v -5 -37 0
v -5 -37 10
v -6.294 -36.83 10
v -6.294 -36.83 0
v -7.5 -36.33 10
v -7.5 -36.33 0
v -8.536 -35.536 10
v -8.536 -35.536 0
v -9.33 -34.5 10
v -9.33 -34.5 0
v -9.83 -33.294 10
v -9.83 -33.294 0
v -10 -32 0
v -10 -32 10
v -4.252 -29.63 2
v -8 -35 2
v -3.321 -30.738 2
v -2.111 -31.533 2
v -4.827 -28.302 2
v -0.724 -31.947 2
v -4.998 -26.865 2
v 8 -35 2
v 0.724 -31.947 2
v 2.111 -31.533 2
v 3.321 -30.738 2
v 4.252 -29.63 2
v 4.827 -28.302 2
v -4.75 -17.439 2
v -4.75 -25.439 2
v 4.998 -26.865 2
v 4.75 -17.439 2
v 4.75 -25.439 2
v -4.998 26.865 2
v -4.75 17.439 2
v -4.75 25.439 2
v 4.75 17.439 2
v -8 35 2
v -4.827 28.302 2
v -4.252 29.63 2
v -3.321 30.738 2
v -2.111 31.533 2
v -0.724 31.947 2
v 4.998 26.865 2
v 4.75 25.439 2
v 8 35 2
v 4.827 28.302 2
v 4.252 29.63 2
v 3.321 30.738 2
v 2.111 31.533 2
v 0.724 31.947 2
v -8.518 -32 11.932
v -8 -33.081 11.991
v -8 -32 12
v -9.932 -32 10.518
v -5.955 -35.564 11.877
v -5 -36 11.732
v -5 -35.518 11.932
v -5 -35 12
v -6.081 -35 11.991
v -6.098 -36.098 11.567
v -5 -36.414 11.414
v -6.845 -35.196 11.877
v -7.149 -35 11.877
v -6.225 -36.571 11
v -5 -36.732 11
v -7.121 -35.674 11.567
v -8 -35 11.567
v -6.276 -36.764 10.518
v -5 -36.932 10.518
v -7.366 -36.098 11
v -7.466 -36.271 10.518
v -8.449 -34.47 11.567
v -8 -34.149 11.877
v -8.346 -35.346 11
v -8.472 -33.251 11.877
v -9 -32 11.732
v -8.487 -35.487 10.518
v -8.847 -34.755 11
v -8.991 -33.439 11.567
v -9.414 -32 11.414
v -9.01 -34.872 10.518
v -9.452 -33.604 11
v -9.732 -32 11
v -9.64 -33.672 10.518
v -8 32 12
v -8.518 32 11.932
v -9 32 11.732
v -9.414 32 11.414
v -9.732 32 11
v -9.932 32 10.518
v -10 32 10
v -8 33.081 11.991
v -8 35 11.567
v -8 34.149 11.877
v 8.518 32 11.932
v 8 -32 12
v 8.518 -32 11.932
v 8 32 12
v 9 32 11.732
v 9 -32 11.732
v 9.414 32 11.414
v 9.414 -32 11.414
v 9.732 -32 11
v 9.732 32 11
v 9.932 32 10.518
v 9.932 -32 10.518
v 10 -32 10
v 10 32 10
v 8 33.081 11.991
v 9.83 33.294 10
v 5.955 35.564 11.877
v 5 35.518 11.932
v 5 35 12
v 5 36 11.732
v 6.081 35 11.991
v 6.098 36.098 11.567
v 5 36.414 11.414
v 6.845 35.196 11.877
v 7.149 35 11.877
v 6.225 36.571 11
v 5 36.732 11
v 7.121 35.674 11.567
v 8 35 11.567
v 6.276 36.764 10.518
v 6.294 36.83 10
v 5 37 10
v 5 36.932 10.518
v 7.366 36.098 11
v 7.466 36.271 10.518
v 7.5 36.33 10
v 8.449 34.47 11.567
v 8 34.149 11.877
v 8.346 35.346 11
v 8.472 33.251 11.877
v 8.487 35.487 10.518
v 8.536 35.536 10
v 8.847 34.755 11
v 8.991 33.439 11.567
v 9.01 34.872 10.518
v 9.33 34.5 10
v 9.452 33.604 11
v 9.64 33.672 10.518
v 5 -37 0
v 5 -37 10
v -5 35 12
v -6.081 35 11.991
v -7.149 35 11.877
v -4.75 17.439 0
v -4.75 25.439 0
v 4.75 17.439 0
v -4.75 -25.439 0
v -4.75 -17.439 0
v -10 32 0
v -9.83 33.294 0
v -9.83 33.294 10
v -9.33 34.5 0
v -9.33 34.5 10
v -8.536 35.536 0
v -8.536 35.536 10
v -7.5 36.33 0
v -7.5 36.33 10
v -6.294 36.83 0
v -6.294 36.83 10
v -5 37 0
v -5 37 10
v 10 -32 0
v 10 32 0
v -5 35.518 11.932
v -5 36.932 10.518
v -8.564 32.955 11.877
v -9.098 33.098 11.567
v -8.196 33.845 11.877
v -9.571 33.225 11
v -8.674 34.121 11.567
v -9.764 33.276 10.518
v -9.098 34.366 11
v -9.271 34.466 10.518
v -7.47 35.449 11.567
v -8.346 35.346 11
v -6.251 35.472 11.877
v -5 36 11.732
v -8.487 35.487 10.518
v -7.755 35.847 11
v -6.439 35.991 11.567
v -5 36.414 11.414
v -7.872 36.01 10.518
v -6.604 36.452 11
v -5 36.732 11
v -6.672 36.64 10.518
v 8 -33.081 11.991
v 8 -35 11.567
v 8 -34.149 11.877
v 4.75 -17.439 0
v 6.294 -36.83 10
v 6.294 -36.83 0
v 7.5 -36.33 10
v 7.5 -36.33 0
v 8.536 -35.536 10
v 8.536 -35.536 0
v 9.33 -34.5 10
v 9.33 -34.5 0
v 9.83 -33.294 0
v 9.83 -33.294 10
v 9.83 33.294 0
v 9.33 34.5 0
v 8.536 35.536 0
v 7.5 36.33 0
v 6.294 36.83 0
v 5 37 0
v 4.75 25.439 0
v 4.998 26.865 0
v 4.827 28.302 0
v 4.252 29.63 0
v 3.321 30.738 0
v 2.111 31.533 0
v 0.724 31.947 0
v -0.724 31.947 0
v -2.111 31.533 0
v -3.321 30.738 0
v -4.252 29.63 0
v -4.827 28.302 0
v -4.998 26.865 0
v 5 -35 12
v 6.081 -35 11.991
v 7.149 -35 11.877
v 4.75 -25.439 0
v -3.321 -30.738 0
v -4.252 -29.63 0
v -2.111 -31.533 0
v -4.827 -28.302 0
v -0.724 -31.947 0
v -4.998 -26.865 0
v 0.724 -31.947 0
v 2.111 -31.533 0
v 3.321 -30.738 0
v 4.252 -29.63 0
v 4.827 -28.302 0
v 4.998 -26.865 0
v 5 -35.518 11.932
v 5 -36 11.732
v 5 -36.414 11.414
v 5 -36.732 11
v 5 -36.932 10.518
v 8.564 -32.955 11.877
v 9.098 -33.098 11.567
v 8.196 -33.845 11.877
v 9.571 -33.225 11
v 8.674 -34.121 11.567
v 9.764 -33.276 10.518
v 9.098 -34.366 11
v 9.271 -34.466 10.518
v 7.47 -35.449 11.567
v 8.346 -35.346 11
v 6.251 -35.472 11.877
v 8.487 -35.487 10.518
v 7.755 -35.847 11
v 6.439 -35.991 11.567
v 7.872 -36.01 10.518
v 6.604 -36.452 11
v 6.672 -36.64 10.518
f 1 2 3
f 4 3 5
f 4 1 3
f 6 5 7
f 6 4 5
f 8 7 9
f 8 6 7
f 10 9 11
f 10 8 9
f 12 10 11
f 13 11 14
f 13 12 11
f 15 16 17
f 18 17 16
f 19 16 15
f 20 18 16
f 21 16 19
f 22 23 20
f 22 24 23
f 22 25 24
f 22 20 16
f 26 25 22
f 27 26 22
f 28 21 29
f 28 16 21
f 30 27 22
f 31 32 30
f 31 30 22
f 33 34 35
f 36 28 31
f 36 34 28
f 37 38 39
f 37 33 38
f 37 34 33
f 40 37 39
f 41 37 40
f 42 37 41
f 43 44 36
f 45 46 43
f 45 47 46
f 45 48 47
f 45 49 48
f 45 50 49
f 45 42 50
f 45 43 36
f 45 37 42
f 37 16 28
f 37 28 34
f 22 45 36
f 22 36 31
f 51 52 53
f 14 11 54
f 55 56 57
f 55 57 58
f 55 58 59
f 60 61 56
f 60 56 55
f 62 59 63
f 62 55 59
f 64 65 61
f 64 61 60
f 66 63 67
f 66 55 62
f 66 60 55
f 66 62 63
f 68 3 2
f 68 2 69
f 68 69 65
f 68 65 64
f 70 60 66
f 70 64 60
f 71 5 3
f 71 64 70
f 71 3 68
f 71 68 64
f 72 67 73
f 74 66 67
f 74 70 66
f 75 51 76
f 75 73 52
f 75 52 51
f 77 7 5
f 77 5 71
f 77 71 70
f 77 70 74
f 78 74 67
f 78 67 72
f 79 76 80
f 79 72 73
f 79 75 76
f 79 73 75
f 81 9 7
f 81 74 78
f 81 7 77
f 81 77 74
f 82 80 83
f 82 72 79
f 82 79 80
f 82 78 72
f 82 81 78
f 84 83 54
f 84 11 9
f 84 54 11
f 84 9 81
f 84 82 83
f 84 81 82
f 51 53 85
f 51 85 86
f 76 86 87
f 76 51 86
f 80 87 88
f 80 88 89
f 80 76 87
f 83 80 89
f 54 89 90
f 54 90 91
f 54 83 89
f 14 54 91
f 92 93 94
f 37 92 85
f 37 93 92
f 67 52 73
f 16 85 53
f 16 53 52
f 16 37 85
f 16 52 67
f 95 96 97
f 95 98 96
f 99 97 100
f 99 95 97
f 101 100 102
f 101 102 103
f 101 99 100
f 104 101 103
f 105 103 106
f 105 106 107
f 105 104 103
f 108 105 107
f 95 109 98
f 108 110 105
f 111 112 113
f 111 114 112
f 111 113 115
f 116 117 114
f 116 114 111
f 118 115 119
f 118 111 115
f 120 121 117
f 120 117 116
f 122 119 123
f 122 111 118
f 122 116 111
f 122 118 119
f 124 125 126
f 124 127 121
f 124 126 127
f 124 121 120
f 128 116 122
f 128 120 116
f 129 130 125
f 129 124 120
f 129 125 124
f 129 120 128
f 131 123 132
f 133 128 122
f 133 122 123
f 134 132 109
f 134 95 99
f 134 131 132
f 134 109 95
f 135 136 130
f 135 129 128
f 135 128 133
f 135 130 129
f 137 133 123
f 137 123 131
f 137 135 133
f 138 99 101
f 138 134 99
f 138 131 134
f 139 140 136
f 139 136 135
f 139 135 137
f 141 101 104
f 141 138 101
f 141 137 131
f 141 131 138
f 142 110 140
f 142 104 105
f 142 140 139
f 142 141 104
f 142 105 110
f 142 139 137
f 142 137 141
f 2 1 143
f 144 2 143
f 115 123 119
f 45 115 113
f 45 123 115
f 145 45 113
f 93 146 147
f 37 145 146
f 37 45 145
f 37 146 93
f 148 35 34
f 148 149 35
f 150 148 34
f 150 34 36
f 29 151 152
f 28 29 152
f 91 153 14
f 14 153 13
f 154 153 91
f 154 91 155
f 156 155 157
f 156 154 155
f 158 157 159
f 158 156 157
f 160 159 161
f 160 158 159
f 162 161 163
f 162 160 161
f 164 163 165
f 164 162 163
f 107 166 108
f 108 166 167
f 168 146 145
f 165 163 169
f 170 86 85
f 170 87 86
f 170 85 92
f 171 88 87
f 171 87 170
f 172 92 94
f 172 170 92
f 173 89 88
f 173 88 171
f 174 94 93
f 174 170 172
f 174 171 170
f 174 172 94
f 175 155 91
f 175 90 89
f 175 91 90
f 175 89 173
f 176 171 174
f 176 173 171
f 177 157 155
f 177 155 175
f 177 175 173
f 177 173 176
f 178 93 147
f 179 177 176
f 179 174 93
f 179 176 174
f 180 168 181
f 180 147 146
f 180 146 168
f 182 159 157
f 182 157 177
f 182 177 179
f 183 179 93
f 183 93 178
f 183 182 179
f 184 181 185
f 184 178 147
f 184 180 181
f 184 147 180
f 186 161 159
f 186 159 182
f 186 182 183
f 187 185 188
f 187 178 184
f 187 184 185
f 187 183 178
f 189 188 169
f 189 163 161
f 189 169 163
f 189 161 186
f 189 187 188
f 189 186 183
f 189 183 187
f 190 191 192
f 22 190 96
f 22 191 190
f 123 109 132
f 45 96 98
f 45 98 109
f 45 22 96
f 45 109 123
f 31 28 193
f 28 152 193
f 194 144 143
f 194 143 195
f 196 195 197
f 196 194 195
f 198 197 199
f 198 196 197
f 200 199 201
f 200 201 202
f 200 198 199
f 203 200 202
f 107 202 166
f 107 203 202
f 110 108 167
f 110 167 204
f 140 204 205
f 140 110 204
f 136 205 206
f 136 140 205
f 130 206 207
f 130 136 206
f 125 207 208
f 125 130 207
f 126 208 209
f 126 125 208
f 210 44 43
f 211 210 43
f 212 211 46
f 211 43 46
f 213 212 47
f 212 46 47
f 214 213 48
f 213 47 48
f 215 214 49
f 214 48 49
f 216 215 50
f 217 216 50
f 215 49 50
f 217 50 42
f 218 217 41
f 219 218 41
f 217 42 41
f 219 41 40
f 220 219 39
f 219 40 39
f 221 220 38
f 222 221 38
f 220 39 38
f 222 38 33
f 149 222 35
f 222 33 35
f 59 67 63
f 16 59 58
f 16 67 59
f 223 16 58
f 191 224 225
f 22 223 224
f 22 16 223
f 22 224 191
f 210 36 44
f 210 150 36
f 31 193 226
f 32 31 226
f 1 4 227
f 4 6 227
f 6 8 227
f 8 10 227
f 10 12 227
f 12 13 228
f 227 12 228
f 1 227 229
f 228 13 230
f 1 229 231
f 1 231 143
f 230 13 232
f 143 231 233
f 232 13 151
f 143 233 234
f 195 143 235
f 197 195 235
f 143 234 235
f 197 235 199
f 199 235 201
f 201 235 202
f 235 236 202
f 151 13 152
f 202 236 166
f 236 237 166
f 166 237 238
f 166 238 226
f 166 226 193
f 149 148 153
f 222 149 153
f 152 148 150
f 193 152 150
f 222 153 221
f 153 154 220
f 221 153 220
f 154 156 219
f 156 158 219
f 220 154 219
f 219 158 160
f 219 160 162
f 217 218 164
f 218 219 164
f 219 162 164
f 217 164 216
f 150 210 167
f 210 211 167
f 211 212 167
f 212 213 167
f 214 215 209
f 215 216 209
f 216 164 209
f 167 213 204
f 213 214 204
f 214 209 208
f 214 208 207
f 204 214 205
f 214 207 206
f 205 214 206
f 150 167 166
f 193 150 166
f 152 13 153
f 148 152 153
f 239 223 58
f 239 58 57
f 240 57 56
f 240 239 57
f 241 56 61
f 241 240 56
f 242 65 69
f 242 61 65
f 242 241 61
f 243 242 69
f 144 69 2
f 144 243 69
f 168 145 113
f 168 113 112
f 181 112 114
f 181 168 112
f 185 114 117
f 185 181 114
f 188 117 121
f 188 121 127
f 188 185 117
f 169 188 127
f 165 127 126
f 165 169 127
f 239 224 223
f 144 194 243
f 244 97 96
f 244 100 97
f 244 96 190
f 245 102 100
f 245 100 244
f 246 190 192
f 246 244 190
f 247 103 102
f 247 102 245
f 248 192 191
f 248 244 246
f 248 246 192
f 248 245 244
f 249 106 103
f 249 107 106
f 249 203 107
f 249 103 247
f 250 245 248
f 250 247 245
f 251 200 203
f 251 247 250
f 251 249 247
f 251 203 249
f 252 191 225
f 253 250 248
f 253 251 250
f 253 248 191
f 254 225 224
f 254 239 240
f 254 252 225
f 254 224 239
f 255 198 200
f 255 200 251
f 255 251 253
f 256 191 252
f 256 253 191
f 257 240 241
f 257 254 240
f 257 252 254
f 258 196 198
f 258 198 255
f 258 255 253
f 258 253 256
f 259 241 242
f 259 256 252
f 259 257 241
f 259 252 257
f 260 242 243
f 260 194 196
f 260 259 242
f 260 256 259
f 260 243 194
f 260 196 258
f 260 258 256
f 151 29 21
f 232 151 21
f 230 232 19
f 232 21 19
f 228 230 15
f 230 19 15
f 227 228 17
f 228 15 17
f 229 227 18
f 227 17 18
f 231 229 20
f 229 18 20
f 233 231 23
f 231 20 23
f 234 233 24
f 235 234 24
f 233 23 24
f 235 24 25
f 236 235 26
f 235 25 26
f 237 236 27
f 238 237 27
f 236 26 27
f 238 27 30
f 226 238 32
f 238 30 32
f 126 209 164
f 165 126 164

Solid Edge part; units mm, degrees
sketch "Sketch1" plane through (0, 0, 0) normal (0, 0, 1) x (1, 0, 0)
  line L0 (-10, -37) -> (10, -37)
  line L1 (10, -37) -> (10, 37)
  line L2 (10, 37) -> (-10, 37)
  line L3 (-10, 37) -> (-10, -37)
  dimension "D1" = 20
  dimension "D2" = 74
extrude "Protrusion1" add sketch "Sketch1" along normal blind 2
sketch "Sketch2" plane through (0, 0, 2) normal (0, 0, 1) x (1, 0, 0)
  line L0 (-10, 37) -> (10, 37)
  line L1 (10, 37) -> (10, -37)
  line L2 (10, -37) -> (-10, -37)
  line L3 (-10, -37) -> (-10, 37)
  line L4 (-8, -35) -> (8, -35)
  line L5 (8, -35) -> (8, 35)
  line L6 (8, 35) -> (-8, 35)
  line L7 (-8, 35) -> (-8, -35)
  dimension "D1" = 16
  dimension "D2" = 70
extrude "Extrusionsausprägung_2" add sketch "Sketch2" along normal blind 10
fillet "Verrundung_3" radius 5 4 edges at (-10, -37, 6) (10, -37, 6) (-10, 37, 6) (10, 37, 6)
fillet "Verrundung_4" radius 2 8 edges at (10, 0, 12) (8.5355, -35.5355, 12) (0, -37, 12) (-8.5355, -35.5355, 12) (-10, 0, 12) (-8.5355, 35.5355, 12) (0, 37, 12) (8.5355, 35.5355, 12)
sketch "Sketch3" plane through (0, 0, 2) normal (0, 0, 1) x (0, -1, 0)
  circle A0 centre (-27, 0) radius 5
  circle A1 centre (27, 0) radius 5
  dimension "D1" = 54
  dimension "D2" = 10
extrude "Cutout1" cut sketch "Sketch3" against normal through all
sketch "Sketch4" plane through (0, 0, 0) normal (0, 0, -1) x (0, -1, 0)
  line L0 (-25.4388, 4.75) -> (-17.4388, 4.75)
  line L1 (-17.4388, 4.75) -> (-17.4388, -4.75)
  line L2 (-17.4388, -4.75) -> (-25.4388, -4.75)
  line L3 (-25.4388, -4.75) -> (-25.4388, 4.75)
  line L4 (25.4388, 4.75) -> (17.4388, 4.75)
  line L5 (17.4388, 4.75) -> (17.4388, -4.75)
  line L6 (17.4388, -4.75) -> (25.4388, -4.75)
  line L7 (25.4388, -4.75) -> (25.4388, 4.75)
  dimension "D1" = 9.5
  dimension "D2" = 8
extrude "Cutout2" cut sketch "Sketch4" against normal through all
